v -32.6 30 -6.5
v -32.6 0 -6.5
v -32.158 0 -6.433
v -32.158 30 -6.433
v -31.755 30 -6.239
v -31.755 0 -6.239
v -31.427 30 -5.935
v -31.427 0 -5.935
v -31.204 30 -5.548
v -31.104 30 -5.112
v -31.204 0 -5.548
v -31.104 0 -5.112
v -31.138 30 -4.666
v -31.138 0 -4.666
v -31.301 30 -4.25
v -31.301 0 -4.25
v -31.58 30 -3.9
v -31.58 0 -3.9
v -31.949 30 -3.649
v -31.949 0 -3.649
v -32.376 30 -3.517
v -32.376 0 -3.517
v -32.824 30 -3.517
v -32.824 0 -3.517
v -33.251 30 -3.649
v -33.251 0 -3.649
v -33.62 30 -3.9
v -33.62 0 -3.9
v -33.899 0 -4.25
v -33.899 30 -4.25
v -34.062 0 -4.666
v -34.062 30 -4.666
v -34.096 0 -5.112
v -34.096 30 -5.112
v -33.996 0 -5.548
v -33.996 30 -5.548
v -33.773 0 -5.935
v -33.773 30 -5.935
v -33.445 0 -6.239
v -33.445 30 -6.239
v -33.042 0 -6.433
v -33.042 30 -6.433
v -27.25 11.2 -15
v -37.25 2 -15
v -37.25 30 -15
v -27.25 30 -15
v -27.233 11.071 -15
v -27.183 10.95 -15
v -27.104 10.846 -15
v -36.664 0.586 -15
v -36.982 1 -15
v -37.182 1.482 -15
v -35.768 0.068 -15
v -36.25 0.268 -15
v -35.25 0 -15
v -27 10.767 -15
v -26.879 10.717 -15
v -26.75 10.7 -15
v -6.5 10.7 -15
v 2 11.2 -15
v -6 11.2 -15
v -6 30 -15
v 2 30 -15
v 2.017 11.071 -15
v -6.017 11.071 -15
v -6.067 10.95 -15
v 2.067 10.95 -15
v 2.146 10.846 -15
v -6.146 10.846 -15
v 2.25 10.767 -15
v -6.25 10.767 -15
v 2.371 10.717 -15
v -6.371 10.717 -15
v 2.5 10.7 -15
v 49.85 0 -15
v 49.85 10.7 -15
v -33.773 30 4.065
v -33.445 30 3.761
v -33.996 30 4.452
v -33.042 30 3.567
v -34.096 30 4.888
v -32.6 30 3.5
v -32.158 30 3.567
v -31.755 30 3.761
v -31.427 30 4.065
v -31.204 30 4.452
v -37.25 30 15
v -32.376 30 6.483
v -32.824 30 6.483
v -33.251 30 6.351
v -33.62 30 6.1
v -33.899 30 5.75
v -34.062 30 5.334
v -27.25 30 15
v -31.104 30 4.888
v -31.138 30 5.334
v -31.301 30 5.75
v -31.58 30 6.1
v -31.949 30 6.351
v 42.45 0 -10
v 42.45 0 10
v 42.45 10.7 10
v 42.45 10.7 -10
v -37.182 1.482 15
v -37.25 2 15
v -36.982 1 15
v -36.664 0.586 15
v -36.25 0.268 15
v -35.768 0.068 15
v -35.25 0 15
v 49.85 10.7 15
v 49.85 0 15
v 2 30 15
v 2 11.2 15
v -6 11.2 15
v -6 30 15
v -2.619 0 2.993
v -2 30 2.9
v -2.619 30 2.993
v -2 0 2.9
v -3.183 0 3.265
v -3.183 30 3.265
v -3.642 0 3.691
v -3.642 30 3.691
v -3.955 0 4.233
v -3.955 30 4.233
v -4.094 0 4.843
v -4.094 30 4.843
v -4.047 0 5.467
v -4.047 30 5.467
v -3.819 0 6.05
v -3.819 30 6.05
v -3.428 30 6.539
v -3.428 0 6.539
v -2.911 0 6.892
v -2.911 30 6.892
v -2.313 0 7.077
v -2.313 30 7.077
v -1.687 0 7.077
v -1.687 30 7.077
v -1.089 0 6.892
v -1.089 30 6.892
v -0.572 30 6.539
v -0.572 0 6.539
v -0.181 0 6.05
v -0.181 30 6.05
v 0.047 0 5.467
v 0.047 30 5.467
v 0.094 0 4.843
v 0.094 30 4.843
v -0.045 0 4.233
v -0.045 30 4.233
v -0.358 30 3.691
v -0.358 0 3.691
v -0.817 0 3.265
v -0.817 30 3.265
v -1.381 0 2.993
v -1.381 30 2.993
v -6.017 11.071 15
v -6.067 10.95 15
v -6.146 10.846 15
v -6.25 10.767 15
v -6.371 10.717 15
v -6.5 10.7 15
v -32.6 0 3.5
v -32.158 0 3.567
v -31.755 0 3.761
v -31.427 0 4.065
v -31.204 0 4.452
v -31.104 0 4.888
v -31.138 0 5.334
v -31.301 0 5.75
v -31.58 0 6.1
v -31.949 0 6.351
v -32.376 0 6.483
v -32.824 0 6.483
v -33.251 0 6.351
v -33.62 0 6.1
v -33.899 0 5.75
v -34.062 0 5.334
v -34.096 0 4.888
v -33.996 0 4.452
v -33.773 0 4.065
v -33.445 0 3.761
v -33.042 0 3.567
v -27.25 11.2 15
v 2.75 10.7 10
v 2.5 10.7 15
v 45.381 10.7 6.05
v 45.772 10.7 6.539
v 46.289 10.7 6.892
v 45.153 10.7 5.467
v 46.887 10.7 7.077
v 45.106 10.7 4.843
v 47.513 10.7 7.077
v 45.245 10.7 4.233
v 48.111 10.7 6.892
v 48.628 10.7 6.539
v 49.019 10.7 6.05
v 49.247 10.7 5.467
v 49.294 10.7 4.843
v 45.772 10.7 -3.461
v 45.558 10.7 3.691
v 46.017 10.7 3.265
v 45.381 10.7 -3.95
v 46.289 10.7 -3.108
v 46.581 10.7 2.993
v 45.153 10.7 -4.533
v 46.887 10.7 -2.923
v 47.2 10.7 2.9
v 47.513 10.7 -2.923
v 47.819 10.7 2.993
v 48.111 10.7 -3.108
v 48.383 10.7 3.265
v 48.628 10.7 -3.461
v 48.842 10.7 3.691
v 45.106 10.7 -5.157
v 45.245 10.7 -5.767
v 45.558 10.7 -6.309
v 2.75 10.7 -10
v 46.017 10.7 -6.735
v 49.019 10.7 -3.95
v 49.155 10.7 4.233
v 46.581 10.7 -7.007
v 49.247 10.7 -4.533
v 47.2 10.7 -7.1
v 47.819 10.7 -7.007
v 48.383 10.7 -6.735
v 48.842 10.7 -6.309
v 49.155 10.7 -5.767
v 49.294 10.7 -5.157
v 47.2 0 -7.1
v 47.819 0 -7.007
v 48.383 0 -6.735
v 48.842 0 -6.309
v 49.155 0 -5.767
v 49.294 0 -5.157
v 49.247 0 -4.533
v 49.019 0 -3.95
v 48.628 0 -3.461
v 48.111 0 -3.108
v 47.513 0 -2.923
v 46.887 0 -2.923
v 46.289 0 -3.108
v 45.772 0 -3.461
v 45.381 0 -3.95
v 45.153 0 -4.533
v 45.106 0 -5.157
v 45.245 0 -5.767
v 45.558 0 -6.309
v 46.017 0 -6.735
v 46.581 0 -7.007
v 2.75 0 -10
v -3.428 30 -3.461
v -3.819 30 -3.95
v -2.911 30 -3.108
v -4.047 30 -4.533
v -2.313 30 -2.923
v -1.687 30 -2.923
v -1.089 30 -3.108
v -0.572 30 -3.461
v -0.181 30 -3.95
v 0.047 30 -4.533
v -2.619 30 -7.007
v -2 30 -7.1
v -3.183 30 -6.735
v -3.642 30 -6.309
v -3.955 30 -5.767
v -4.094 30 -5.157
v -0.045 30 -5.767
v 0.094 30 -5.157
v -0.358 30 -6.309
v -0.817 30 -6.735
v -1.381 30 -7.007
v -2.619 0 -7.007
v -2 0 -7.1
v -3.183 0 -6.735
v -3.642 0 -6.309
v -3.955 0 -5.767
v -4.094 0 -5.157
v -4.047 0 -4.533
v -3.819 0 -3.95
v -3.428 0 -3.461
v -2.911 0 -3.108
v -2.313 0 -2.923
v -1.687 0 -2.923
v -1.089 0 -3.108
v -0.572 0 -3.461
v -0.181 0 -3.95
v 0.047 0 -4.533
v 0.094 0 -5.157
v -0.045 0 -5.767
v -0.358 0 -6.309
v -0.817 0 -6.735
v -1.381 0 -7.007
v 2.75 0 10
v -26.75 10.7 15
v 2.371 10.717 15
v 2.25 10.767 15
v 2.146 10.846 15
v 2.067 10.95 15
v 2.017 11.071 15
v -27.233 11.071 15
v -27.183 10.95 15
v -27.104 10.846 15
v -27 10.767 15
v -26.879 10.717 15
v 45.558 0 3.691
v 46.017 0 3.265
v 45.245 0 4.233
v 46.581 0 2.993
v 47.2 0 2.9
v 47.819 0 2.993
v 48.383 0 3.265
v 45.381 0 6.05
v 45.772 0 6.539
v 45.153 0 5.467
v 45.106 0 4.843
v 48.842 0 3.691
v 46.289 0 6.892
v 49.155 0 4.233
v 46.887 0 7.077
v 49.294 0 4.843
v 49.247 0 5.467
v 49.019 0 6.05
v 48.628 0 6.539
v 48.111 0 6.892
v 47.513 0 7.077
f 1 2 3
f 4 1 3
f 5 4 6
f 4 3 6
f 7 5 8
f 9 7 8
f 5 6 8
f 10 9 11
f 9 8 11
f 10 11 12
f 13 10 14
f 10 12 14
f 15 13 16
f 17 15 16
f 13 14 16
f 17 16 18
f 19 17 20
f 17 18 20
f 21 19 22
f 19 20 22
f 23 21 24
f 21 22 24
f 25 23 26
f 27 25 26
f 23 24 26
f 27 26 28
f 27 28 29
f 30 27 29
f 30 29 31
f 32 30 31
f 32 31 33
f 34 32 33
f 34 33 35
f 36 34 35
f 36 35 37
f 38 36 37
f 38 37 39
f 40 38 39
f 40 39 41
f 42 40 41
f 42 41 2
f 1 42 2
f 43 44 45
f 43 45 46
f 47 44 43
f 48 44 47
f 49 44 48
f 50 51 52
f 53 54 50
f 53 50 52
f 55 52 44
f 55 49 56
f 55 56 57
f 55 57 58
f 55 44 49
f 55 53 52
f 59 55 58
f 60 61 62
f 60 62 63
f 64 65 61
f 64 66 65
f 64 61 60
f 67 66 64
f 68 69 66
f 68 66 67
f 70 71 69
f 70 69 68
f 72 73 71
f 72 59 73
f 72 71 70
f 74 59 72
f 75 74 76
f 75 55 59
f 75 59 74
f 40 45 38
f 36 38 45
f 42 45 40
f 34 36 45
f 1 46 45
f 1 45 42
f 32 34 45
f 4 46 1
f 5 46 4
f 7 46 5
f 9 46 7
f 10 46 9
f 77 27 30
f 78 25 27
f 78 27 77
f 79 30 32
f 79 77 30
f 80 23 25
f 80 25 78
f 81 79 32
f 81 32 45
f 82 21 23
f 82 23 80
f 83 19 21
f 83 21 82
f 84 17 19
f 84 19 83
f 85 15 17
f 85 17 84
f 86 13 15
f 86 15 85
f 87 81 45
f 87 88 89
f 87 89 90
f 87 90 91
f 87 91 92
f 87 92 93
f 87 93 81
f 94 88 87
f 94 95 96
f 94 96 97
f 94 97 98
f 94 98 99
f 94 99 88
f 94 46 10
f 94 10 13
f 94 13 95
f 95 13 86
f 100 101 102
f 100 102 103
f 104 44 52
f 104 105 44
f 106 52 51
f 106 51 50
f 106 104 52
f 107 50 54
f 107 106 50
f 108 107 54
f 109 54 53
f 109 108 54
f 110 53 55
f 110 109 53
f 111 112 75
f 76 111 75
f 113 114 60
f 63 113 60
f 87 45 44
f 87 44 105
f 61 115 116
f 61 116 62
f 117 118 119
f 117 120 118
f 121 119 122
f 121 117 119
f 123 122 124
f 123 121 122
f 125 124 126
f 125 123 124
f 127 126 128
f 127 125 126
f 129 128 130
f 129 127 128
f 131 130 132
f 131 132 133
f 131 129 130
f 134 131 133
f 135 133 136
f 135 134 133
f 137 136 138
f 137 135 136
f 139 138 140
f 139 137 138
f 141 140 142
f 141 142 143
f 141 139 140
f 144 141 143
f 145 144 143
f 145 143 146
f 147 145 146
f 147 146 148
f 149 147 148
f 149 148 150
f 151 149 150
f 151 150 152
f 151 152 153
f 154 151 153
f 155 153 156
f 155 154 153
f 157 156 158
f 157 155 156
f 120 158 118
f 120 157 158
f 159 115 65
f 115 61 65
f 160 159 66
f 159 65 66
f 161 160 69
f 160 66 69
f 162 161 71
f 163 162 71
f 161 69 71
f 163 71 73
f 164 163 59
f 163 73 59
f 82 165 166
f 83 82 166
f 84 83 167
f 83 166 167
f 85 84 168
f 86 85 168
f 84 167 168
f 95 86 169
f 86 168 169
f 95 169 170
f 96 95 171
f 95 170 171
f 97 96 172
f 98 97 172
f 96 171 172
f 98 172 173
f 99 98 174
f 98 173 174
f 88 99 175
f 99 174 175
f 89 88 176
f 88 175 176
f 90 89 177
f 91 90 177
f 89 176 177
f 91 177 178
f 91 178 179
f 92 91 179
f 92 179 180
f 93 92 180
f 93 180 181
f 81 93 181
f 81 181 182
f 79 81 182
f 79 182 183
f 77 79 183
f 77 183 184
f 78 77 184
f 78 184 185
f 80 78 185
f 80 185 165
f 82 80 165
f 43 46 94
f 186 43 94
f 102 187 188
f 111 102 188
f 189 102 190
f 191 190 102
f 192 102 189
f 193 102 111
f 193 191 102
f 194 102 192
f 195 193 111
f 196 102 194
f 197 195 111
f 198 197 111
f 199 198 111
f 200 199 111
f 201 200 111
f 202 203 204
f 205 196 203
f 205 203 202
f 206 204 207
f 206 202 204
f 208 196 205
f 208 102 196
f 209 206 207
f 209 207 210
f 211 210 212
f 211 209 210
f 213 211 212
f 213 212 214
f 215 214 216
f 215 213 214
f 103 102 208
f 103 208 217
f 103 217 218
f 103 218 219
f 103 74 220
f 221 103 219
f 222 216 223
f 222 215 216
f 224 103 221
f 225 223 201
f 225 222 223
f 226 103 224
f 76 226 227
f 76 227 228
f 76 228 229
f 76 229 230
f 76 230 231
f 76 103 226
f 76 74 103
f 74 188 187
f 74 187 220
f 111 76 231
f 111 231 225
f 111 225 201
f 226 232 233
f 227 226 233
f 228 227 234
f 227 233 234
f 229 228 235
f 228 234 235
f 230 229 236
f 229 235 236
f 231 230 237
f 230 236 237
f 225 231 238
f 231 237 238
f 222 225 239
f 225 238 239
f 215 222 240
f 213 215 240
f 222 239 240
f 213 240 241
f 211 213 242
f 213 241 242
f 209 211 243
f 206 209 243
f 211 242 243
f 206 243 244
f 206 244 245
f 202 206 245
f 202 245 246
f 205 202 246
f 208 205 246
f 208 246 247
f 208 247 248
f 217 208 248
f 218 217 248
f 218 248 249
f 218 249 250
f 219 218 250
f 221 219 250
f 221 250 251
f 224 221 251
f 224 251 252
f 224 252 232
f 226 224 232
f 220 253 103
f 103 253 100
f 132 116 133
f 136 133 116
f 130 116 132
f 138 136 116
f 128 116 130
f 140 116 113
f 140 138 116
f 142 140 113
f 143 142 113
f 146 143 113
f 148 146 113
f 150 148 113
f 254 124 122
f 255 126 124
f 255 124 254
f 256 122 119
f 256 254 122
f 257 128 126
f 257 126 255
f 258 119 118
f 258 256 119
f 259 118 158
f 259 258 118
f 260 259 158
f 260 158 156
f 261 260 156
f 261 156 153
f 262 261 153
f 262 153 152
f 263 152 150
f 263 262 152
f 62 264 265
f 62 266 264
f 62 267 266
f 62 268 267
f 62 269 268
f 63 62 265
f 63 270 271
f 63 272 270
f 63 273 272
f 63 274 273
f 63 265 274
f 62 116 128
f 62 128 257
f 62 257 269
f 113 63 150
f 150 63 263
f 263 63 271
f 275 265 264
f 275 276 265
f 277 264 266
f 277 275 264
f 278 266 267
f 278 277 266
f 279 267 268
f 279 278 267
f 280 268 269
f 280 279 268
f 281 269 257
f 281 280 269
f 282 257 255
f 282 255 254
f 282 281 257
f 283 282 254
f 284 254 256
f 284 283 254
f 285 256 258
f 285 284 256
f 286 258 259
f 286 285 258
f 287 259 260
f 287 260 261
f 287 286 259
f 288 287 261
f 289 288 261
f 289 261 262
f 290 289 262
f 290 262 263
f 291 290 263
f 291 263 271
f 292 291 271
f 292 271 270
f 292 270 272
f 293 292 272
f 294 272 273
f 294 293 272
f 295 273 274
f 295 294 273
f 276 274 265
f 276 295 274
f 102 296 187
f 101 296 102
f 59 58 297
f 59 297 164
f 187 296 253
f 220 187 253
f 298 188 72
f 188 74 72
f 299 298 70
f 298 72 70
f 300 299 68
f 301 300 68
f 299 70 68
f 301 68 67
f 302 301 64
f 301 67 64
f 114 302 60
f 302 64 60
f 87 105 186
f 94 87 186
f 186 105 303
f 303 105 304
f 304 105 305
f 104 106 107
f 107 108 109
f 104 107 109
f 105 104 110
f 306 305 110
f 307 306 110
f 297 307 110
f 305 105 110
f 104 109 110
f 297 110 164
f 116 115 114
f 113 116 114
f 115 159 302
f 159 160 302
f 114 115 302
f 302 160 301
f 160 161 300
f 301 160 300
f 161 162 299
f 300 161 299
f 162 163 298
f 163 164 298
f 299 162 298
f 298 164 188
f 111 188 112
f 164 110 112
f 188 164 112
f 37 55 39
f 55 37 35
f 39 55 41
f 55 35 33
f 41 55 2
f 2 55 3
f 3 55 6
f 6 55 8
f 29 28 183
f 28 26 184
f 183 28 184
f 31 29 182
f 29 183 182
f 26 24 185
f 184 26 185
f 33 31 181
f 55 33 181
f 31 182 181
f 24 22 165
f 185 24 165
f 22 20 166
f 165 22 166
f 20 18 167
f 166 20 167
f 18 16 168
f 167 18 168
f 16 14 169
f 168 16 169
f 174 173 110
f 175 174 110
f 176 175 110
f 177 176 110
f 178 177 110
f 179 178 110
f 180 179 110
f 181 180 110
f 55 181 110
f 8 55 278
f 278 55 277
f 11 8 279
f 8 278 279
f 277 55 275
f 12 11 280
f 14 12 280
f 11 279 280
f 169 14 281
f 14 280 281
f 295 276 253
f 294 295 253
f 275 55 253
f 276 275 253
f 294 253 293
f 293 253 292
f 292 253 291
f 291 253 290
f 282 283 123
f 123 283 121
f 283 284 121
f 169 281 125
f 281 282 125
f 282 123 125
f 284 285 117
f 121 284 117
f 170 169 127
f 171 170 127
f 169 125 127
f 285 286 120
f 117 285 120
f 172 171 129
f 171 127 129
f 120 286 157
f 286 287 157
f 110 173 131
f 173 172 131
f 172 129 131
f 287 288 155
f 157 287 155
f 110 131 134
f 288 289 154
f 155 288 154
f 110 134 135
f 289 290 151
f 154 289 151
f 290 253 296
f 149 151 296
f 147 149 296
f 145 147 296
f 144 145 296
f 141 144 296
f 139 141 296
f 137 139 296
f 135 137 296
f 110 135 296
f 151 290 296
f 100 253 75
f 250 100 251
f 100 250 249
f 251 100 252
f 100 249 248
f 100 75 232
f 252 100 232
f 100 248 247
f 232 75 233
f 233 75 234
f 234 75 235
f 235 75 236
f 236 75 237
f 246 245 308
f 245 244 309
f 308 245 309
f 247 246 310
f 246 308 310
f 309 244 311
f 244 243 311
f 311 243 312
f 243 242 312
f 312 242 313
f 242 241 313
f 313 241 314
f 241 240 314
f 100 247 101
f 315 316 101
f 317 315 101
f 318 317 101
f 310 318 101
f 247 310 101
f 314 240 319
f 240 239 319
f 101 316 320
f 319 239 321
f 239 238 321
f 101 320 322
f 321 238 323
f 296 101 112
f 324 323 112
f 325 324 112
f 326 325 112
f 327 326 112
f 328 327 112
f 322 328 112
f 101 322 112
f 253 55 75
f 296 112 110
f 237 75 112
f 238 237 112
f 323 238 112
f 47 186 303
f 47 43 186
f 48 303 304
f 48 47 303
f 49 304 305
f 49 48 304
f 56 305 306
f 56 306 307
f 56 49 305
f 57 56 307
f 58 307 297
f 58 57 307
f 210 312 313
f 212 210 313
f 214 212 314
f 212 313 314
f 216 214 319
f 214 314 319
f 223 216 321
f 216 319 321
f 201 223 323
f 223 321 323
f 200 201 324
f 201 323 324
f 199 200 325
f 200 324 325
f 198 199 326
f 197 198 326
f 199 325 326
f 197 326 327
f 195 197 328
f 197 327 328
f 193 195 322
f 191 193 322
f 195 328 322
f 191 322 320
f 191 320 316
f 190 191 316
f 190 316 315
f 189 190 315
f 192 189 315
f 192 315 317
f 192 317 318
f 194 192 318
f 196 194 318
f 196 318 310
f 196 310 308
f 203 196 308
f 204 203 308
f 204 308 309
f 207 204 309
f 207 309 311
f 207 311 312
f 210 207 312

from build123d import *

# Parameters (mm, degrees)
SKETCH1_W           = 77.1
SKETCH1_H           = 30
SKETCH1_W_2         = 39.7
SKETCH1_H_2         = 20
BOSS_EXTRUDE1_DEPTH = 10.7
SKETCH4_W           = 30
SKETCH4_H           = 30
BOSS_EXTRUDE3_DEPTH = 10
CUT_EXTRUDE2_REACH  = 62.083
SKETCH6_R           = 2.1
FILLET5_R           = 2
FILLET6_R           = 0.5
CUT_EXTRUDE3_REACH  = 62.083
SKETCH7_R           = 1.5
SKETCH9_W           = 8
SKETCH9_H           = 30
SKETCH9_R           = 2.1
BOSS_EXTRUDE4_DEPTH = 19.3
FILLET7_R           = 0.5


with BuildPart() as part:
    # Sketch1 → Boss-Extrude1 (new body)
    with BuildSketch(Plane(origin=(0, 0, 0), x_dir=(1, 0, 0), z_dir=(0, 1, 0))):
        with Locations((11.3, 0)):
            Rectangle(SKETCH1_W, SKETCH1_H)
        with Locations((22.6, 0)):
            Rectangle(SKETCH1_W_2, SKETCH1_H_2, mode=Mode.SUBTRACT)
    extrude(amount=BOSS_EXTRUDE1_DEPTH)

    # Sketch4 → Boss-Extrude3 (add)
    with BuildSketch(Plane.ZY.offset(27.25)):
        with Locations((0, 15)):
            Rectangle(SKETCH4_W, SKETCH4_H)
    extrude(amount=BOSS_EXTRUDE3_DEPTH)

    # Sketch6 → Cut-Extrude2 (cut, up to next)
    with BuildSketch(Plane(origin=(0, 0, 0), x_dir=(-1, 0, 0), z_dir=(0, -1, 0)), mode=Mode.PRIVATE) as cut_extrude2_sk1:
        with Locations(Location((2, 5, 0), (0, 0, 90))):
            Circle(SKETCH6_R)
    cut_extrude2_tool1 = extrude(cut_extrude2_sk1.sketch, amount=-CUT_EXTRUDE2_REACH, mode=Mode.PRIVATE) & part.part
    # Sketch6 → Cut-Extrude2 (cut, up to next)
    with BuildSketch(Plane(origin=(0, 0, 0), x_dir=(-1, 0, 0), z_dir=(0, -1, 0)), mode=Mode.PRIVATE) as cut_extrude2_sk2:
        with Locations(Location((2, -5, 0), (0, 0, 90))):
            Circle(SKETCH6_R)
    cut_extrude2_tool2 = extrude(cut_extrude2_sk2.sketch, amount=-CUT_EXTRUDE2_REACH, mode=Mode.PRIVATE) & part.part
    # Sketch6 → Cut-Extrude2 (cut, up to next)
    with BuildSketch(Plane(origin=(0, 0, 0), x_dir=(-1, 0, 0), z_dir=(0, -1, 0)), mode=Mode.PRIVATE) as cut_extrude2_sk3:
        with Locations(Location((-47.2, 5, 0), (0, 0, 90))):
            Circle(SKETCH6_R)
    cut_extrude2_tool3 = extrude(cut_extrude2_sk3.sketch, amount=-CUT_EXTRUDE2_REACH, mode=Mode.PRIVATE) & part.part
    # Sketch6 → Cut-Extrude2 (cut, up to next)
    with BuildSketch(Plane(origin=(0, 0, 0), x_dir=(-1, 0, 0), z_dir=(0, -1, 0)), mode=Mode.PRIVATE) as cut_extrude2_sk4:
        with Locations(Location((-47.2, -5, 0), (0, 0, 90))):
            Circle(SKETCH6_R)
    cut_extrude2_tool4 = extrude(cut_extrude2_sk4.sketch, amount=-CUT_EXTRUDE2_REACH, mode=Mode.PRIVATE) & part.part
    add(cut_extrude2_tool1.solids().sort_by_distance((-2, 0, -5))[0], mode=Mode.SUBTRACT)
    add(cut_extrude2_tool2.solids().sort_by_distance((-2, 0, 5))[0], mode=Mode.SUBTRACT)
    add(cut_extrude2_tool3.solids().sort_by_distance((47.2, 0, -5))[0], mode=Mode.SUBTRACT)
    add(cut_extrude2_tool4.solids().sort_by_distance((47.2, 0, 5))[0], mode=Mode.SUBTRACT)

    # Fillet5
    fillet5_edges = [part.edges().sort_by_distance(p)[0] for p in [
        (-37.25, 0, 0),
    ]]
    fillet(fillet5_edges, radius=FILLET5_R)

    # Fillet6
    fillet6_edges = [part.edges().sort_by_distance(p)[0] for p in [
        (-27.25, 10.7, 0),
    ]]
    fillet(fillet6_edges, radius=FILLET6_R)

    # Sketch7 → Cut-Extrude3 (cut, up to next)
    with BuildSketch(Plane(origin=(0, 0, 0), x_dir=(-1, 0, 0), z_dir=(0, -1, 0)), mode=Mode.PRIVATE) as cut_extrude3_sk1:
        with Locations(Location((32.6, -5, 0), (0, 0, 90))):
            Circle(SKETCH7_R)
    cut_extrude3_tool1 = extrude(cut_extrude3_sk1.sketch, amount=-CUT_EXTRUDE3_REACH, mode=Mode.PRIVATE) & part.part
    # Sketch7 → Cut-Extrude3 (cut, up to next)
    with BuildSketch(Plane(origin=(0, 0, 0), x_dir=(-1, 0, 0), z_dir=(0, -1, 0)), mode=Mode.PRIVATE) as cut_extrude3_sk2:
        with Locations(Location((32.6, 5, 0), (0, 0, 90))):
            Circle(SKETCH7_R)
    cut_extrude3_tool2 = extrude(cut_extrude3_sk2.sketch, amount=-CUT_EXTRUDE3_REACH, mode=Mode.PRIVATE) & part.part
    add(cut_extrude3_tool1.solids().sort_by_distance((-32.6, 0, 5))[0], mode=Mode.SUBTRACT)
    add(cut_extrude3_tool2.solids().sort_by_distance((-32.6, 0, -5))[0], mode=Mode.SUBTRACT)

    # Sketch9 → Boss-Extrude4 (add)
    with BuildSketch(Plane(origin=(0, 10.7, 0), x_dir=(1, 0, 0), z_dir=(0, 1, 0))):
        with Locations((-2, 0)):
            Rectangle(SKETCH9_W, SKETCH9_H)
        with Locations(Location((-2, 5, 0), (0, 0, 90))):
            Circle(SKETCH9_R, mode=Mode.SUBTRACT)
        with Locations(Location((-2, -5, 0), (0, 0, 90))):
            Circle(SKETCH9_R, mode=Mode.SUBTRACT)
    extrude(amount=BOSS_EXTRUDE4_DEPTH)

    # Fillet7
    fillet7_edges = [part.edges().sort_by_distance(p)[0] for p in [
        (-6, 10.7, 0),
        (2, 10.7, 0),
    ]]
    fillet(fillet7_edges, radius=FILLET7_R)


solid = part.part
